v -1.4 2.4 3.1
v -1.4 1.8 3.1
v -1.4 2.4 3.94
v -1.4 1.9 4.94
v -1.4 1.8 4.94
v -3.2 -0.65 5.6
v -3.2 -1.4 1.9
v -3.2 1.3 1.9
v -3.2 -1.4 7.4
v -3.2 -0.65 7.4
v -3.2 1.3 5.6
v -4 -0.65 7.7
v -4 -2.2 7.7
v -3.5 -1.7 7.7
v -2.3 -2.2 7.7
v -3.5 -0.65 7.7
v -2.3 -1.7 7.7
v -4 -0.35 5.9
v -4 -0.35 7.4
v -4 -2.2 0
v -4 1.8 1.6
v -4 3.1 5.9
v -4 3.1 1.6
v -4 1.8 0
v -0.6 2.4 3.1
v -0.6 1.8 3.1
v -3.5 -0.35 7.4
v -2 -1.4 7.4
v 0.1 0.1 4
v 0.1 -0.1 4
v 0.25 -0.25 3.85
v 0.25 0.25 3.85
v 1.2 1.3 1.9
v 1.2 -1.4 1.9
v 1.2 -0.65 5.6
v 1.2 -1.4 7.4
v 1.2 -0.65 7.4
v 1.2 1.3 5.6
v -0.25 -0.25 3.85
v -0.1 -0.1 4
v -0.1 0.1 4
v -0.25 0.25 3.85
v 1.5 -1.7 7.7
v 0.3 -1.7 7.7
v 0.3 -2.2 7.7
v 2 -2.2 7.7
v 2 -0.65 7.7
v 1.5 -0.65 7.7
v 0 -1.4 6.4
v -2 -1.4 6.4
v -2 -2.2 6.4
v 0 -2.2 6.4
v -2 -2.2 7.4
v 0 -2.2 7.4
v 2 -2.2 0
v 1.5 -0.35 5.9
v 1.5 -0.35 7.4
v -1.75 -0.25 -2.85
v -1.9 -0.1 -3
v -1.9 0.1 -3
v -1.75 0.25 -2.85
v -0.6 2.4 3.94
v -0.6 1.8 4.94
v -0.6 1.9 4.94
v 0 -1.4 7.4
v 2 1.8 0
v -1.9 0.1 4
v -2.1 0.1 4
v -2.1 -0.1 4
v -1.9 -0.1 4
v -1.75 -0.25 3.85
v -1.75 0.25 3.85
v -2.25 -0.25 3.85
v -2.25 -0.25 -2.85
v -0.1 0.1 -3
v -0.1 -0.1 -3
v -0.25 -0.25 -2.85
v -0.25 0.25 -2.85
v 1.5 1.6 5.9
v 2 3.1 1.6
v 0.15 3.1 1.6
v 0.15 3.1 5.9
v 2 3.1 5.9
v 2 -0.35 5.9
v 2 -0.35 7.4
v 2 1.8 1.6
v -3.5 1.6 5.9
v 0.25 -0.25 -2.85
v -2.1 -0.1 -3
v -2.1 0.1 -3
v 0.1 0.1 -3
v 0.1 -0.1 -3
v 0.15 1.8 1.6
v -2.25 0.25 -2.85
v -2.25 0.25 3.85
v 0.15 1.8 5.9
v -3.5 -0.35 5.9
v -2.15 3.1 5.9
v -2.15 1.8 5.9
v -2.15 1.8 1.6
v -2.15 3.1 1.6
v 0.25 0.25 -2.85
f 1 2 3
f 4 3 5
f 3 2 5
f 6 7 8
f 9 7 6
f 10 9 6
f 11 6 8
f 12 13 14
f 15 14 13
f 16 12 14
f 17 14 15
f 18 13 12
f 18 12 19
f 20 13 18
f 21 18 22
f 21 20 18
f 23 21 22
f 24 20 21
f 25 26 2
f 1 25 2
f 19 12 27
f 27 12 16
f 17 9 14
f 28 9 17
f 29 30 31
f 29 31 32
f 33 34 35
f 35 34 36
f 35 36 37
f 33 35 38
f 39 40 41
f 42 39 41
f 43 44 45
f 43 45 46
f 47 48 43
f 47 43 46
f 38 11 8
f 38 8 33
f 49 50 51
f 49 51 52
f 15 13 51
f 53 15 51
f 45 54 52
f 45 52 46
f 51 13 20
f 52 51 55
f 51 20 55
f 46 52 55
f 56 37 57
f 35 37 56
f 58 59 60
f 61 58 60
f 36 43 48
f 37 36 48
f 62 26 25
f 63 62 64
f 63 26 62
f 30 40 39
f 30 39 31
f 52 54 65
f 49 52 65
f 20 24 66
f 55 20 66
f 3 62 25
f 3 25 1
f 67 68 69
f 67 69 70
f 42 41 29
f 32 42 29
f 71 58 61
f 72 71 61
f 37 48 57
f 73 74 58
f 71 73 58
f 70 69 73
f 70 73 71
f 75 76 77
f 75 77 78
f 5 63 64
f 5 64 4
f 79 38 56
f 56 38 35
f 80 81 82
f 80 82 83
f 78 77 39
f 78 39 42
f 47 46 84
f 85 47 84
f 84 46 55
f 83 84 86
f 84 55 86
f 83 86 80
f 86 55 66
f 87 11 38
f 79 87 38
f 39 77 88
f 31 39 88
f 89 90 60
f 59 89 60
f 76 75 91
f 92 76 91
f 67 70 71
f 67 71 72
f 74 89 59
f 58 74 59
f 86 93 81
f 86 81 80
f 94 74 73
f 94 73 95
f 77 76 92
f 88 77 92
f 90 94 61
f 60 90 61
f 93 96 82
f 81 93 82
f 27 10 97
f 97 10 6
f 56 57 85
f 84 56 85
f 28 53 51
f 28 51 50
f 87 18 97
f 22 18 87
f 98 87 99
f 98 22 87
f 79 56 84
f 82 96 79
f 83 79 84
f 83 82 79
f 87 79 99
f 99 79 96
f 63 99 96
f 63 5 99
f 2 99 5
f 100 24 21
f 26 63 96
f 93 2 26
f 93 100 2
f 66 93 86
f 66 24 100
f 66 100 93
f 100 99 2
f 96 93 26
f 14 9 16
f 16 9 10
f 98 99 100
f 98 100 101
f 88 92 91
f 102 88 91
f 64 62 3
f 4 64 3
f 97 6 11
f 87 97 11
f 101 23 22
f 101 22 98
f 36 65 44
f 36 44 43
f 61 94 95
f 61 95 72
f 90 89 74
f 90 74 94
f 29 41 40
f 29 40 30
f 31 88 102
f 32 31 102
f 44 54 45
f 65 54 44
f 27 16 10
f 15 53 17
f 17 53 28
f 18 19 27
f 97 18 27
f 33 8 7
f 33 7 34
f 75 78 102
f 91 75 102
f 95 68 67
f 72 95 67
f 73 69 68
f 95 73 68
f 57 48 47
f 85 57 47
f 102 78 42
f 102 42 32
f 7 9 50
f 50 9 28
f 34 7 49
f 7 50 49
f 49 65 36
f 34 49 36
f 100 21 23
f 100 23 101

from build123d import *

# Parameters (mm, degrees)
F0_W          = 0.5
F0_H          = 0.5
F1_DEPTH      = 3
F1_DEPTH_BACK = 4
F2_W          = 6
F2_H          = 5.3
F3_DEPTH      = 7.7
F4_W          = 4.4
F4_H          = 2.7
F5_DEPTH      = 5.8
F6_W          = 2
F6_H          = 0.8
F7_DEPTH      = 1.3
F8_DEPTH      = 1.8
F9_W          = 2.3
F9_H          = 1.3
F10_DEPTH     = 25
F11_W         = 0.8
F11_H         = 1.84
F12_DEPTH     = 0.6
F13_W         = 1.85
F13_H         = 1.3
F14_DEPTH     = 1.6
F15_SIZE2     = 1
F15_SIZE      = 0.5
F16_SIZE      = 0.3
F17_SIZE      = 0.15
F17_2_SIZE    = 0.15


with BuildPart() as f1:
    # F0 (on Top) → F1 (new body, two sides)
    with BuildSketch(Plane.XY) as f1_sk:
        with Locations((-2, 0)):
            Rectangle(F0_W, F0_H)
    extrude(amount=-F1_DEPTH)
    extrude(f1_sk.sketch, amount=F1_DEPTH_BACK)

    # F17
    f17_edges = [f1.edges().sort_by_distance(p)[0] for p in [
        (-2, 0.25, 4),
        (-2.25, 0, 4),
        (-2, -0.25, 4),
        (-1.75, 0, 4),
        (-2, 0.25, -3),
        (-2.25, 0, -3),
        (-2, -0.25, -3),
        (-1.75, 0, -3),
    ]]
    chamfer(f17_edges, length=F17_SIZE)


with BuildPart() as f1b:
    # F0 (on Top) → F1, piece 2 (new body, two sides)
    with BuildSketch(Plane.XY) as f1_2_sk:
        Rectangle(F0_W, F0_H)
    extrude(amount=-F1_DEPTH)
    extrude(f1_2_sk.sketch, amount=F1_DEPTH_BACK)

    # F17#2
    f17_2_edges = [f1b.edges().sort_by_distance(p)[0] for p in [
        (0.25, 0, 4),
        (0, 0.25, 4),
        (-0.25, 0, 4),
        (0, -0.25, 4),
        (0.25, 0, -3),
        (0, 0.25, -3),
        (-0.25, 0, -3),
        (0, -0.25, -3),
    ]]
    chamfer(f17_2_edges, length=F17_2_SIZE)


with BuildPart() as f3:
    # F2 (on Top) → F3 (new body)
    with BuildSketch(Plane.XY):
        with Locations((-1, 0.45)):
            Rectangle(F2_W, F2_H)
    extrude(amount=F3_DEPTH)

    # F4 (on face) → F5 (cut)
    with BuildSketch(Plane.XY.offset(7.7)):
        with Locations((-1, -0.05)):
            Rectangle(F4_W, F4_H)
    extrude(amount=-F5_DEPTH, mode=Mode.SUBTRACT)

    # F6 (on face) → F7 (cut)
    with BuildSketch(Plane.XY.offset(7.7)):
        with Locations((-1, -1.8)):
            Rectangle(F6_W, F6_H)
    extrude(amount=-F7_DEPTH, mode=Mode.SUBTRACT)

    # F6 (on face) → F8 (cut)
    with BuildSketch(Plane.XY.offset(7.7)):
        Polygon((-4, 3.1), (-4, -0.35), (-3.2, -0.35), (-3.2, 1.3), (1.2, 1.3), (1.2, -0.35), (2, -0.35), (2, 3.1), align=None)
    extrude(amount=-F8_DEPTH, mode=Mode.SUBTRACT)

    # F9 (on face) → F10 (cut)
    with BuildSketch(Plane.XY.offset(5.9)):
        with Locations((-1, 2.45)):
            Rectangle(F9_W, F9_H)
    extrude(amount=-F10_DEPTH, mode=Mode.SUBTRACT)

    # F11 (on face) → F12 (join)
    with BuildSketch(Plane(origin=(0, 1.8, 0), x_dir=(-1, 0, 0), z_dir=(0, 1, 0))):
        with Locations((1, 4.02)):
            Rectangle(F11_W, F11_H)
    extrude(amount=F12_DEPTH)

    # F13 (on face) → F14 (cut)
    with BuildSketch(Plane(origin=(0, 0, 0), x_dir=(1, 0, 0), z_dir=(0, 0, -1))):
        with Locations((-3.075, -2.45)):
            Rectangle(F13_W, F13_H)
        with Locations((1.075, -2.45)):
            Rectangle(F13_W, F13_H)
    extrude(amount=-F14_DEPTH, mode=Mode.SUBTRACT)

    # F15
    f15_edges = [f3.edges().sort_by_distance(p)[0] for p in [
        (-1, 2.4, 4.94),
    ]]
    f15_side = f3.faces().sort_by_distance((-1, 2.1, 4.94))[0]
    chamfer(f15_edges, length=F15_SIZE, length2=F15_SIZE2, reference=f15_side)

    # F16
    f16_edges = [f3.edges().sort_by_distance(p)[0] for p in [
        (-2.6, -1.4, 7.7),
        (-3.2, -0.875, 7.7),
        (0.6, -1.4, 7.7),
        (1.2, -0.875, 7.7),
        (-2, -1.8, 7.7),
        (0, -1.8, 7.7),
        (-3.6, -0.35, 7.7),
        (1.6, -0.35, 7.7),
        (1.2, -0.35, 6.8),
        (1.2, 0.475, 5.9),
        (-1, 1.3, 5.9),
        (-3.2, 0.475, 5.9),
        (-3.2, -0.35, 6.8),
    ]]
    chamfer(f16_edges, length=F16_SIZE)


solid = Compound([f1.part, f1b.part, f3.part])
